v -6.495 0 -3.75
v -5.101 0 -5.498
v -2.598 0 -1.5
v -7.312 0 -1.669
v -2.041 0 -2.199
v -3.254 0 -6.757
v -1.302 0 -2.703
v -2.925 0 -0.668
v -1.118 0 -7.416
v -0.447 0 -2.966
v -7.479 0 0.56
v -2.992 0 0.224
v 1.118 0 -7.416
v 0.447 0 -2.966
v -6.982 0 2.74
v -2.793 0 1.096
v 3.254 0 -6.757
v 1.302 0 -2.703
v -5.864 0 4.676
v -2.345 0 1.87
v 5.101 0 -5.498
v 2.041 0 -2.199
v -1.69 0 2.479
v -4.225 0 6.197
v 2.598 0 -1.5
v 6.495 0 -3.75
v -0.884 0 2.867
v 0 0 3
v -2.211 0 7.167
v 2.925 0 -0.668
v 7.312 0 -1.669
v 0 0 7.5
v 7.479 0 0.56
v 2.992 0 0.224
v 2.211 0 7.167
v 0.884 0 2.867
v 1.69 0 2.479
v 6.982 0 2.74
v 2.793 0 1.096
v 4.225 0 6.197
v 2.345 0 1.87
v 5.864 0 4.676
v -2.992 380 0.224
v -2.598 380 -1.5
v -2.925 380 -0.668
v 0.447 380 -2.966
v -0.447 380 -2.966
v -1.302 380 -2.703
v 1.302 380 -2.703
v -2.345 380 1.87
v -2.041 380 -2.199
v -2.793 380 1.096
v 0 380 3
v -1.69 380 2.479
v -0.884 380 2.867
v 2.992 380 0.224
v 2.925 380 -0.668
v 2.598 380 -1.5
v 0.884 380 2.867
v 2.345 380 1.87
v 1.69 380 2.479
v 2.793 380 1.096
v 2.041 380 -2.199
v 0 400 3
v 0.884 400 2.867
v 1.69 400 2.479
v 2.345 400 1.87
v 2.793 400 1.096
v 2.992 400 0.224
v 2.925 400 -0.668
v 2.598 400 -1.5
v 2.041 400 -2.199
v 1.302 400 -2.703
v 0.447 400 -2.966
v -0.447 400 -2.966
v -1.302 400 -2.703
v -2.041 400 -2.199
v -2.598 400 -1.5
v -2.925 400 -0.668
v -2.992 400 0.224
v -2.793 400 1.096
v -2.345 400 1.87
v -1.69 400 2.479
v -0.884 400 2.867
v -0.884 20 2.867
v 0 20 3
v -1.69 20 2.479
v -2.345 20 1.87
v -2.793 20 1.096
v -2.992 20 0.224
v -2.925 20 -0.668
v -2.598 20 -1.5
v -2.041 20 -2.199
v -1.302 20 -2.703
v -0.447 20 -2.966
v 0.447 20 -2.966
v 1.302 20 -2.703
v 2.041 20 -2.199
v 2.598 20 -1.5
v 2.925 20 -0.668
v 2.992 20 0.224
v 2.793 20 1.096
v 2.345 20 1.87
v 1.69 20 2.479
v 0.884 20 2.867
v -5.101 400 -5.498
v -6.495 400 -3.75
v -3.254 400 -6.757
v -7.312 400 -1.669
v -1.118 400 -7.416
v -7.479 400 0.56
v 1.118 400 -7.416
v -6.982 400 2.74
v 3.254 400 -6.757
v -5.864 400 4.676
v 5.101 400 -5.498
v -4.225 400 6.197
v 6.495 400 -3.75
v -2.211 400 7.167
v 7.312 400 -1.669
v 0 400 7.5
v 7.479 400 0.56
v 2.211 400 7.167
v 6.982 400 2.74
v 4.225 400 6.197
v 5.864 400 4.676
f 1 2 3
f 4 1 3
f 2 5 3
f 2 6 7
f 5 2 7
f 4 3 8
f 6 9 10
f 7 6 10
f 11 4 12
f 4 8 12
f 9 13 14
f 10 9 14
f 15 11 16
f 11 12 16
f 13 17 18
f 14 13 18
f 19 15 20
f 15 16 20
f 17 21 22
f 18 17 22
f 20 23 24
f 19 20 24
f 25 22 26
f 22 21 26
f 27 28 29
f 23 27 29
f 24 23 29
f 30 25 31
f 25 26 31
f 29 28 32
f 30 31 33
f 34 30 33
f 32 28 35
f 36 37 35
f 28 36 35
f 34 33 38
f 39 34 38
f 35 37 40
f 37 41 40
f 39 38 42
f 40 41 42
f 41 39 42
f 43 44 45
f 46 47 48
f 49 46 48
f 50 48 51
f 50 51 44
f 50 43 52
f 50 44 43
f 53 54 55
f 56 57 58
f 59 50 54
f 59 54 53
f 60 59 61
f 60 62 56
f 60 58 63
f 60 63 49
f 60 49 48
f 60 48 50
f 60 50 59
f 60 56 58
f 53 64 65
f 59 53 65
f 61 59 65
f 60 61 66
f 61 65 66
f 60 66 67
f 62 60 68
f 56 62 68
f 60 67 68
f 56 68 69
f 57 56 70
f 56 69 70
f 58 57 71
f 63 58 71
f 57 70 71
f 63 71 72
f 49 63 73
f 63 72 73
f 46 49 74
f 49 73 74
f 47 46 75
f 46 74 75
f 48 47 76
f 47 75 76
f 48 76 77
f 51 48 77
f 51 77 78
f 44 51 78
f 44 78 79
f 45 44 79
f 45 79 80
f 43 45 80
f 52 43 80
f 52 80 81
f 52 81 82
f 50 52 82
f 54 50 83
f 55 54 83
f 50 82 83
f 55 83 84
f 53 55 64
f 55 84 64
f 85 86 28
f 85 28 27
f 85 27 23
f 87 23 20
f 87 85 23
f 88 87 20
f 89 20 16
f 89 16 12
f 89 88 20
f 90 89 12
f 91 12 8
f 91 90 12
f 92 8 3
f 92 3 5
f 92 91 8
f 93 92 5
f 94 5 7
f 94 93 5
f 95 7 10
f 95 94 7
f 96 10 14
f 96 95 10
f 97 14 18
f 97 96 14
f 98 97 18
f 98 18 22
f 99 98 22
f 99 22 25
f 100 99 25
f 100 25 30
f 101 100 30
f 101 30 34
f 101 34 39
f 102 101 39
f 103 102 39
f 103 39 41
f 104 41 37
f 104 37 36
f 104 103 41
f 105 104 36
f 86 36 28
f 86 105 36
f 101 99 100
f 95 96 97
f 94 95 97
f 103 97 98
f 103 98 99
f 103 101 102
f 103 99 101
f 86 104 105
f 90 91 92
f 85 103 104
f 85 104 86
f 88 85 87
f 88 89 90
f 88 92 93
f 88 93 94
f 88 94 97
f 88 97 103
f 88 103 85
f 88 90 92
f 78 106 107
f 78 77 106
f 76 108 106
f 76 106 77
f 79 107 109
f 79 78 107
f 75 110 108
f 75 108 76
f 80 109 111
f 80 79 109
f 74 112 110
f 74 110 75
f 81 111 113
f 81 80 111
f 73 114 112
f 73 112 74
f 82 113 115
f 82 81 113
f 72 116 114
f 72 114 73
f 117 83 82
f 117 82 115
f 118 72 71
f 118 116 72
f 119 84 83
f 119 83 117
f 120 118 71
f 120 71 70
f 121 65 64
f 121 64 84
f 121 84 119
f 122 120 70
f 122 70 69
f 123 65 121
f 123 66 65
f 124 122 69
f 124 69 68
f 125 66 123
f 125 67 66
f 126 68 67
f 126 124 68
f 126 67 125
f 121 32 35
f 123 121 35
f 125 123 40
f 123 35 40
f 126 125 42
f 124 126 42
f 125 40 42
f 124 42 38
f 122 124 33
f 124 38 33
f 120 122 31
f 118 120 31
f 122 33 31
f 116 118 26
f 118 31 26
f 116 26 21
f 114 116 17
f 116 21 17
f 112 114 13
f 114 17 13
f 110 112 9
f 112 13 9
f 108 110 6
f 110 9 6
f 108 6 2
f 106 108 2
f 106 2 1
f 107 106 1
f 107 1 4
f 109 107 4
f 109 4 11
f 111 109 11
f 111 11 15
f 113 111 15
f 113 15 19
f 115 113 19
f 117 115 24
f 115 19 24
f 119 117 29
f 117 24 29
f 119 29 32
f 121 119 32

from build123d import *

# Parameters (mm, degrees)
SKETCH_1_R          = 7.5
EXTRUDE_1_DEPTH     = 400
SKETCH_2_R          = 3
CUT_EXTRUDE_1_DEPTH = 20
CUT_EXTRUDE_START   = -20
SKETCH_3_R          = 3
CUT_EXTRUDE_2_DEPTH = 20


with BuildPart() as part:
    # 草图1 → 凸台-拉伸1 (new body)
    with BuildSketch(Plane(origin=(0, 0, 0), x_dir=(1, 0, 0), z_dir=(0, 1, 0))):
        with Locations(Location((0, 0, 0), (0, 0, 270))):
            Circle(SKETCH_1_R)
    extrude(amount=EXTRUDE_1_DEPTH)

    # 草图2 → 切除-拉伸1 (cut)
    with BuildSketch(Plane(origin=(0, 400, 0), x_dir=(1, 0, 0), z_dir=(0, 1, 0))):
        with Locations(Location((0, 0, 0), (0, 0, 270))):
            Circle(SKETCH_2_R)
    extrude(amount=-CUT_EXTRUDE_1_DEPTH, mode=Mode.SUBTRACT)

    # 草图3 → 切除-拉伸2 (cut)
    with BuildSketch(Plane(origin=(0, 0, 0), x_dir=(-1, 0, 0), z_dir=(0, -1, 0)).offset(CUT_EXTRUDE_START)):
        with Locations(Location((0, 0, 0), (0, 0, 270))):
            Circle(SKETCH_3_R)
    extrude(amount=CUT_EXTRUDE_2_DEPTH, mode=Mode.SUBTRACT)


solid = part.part
